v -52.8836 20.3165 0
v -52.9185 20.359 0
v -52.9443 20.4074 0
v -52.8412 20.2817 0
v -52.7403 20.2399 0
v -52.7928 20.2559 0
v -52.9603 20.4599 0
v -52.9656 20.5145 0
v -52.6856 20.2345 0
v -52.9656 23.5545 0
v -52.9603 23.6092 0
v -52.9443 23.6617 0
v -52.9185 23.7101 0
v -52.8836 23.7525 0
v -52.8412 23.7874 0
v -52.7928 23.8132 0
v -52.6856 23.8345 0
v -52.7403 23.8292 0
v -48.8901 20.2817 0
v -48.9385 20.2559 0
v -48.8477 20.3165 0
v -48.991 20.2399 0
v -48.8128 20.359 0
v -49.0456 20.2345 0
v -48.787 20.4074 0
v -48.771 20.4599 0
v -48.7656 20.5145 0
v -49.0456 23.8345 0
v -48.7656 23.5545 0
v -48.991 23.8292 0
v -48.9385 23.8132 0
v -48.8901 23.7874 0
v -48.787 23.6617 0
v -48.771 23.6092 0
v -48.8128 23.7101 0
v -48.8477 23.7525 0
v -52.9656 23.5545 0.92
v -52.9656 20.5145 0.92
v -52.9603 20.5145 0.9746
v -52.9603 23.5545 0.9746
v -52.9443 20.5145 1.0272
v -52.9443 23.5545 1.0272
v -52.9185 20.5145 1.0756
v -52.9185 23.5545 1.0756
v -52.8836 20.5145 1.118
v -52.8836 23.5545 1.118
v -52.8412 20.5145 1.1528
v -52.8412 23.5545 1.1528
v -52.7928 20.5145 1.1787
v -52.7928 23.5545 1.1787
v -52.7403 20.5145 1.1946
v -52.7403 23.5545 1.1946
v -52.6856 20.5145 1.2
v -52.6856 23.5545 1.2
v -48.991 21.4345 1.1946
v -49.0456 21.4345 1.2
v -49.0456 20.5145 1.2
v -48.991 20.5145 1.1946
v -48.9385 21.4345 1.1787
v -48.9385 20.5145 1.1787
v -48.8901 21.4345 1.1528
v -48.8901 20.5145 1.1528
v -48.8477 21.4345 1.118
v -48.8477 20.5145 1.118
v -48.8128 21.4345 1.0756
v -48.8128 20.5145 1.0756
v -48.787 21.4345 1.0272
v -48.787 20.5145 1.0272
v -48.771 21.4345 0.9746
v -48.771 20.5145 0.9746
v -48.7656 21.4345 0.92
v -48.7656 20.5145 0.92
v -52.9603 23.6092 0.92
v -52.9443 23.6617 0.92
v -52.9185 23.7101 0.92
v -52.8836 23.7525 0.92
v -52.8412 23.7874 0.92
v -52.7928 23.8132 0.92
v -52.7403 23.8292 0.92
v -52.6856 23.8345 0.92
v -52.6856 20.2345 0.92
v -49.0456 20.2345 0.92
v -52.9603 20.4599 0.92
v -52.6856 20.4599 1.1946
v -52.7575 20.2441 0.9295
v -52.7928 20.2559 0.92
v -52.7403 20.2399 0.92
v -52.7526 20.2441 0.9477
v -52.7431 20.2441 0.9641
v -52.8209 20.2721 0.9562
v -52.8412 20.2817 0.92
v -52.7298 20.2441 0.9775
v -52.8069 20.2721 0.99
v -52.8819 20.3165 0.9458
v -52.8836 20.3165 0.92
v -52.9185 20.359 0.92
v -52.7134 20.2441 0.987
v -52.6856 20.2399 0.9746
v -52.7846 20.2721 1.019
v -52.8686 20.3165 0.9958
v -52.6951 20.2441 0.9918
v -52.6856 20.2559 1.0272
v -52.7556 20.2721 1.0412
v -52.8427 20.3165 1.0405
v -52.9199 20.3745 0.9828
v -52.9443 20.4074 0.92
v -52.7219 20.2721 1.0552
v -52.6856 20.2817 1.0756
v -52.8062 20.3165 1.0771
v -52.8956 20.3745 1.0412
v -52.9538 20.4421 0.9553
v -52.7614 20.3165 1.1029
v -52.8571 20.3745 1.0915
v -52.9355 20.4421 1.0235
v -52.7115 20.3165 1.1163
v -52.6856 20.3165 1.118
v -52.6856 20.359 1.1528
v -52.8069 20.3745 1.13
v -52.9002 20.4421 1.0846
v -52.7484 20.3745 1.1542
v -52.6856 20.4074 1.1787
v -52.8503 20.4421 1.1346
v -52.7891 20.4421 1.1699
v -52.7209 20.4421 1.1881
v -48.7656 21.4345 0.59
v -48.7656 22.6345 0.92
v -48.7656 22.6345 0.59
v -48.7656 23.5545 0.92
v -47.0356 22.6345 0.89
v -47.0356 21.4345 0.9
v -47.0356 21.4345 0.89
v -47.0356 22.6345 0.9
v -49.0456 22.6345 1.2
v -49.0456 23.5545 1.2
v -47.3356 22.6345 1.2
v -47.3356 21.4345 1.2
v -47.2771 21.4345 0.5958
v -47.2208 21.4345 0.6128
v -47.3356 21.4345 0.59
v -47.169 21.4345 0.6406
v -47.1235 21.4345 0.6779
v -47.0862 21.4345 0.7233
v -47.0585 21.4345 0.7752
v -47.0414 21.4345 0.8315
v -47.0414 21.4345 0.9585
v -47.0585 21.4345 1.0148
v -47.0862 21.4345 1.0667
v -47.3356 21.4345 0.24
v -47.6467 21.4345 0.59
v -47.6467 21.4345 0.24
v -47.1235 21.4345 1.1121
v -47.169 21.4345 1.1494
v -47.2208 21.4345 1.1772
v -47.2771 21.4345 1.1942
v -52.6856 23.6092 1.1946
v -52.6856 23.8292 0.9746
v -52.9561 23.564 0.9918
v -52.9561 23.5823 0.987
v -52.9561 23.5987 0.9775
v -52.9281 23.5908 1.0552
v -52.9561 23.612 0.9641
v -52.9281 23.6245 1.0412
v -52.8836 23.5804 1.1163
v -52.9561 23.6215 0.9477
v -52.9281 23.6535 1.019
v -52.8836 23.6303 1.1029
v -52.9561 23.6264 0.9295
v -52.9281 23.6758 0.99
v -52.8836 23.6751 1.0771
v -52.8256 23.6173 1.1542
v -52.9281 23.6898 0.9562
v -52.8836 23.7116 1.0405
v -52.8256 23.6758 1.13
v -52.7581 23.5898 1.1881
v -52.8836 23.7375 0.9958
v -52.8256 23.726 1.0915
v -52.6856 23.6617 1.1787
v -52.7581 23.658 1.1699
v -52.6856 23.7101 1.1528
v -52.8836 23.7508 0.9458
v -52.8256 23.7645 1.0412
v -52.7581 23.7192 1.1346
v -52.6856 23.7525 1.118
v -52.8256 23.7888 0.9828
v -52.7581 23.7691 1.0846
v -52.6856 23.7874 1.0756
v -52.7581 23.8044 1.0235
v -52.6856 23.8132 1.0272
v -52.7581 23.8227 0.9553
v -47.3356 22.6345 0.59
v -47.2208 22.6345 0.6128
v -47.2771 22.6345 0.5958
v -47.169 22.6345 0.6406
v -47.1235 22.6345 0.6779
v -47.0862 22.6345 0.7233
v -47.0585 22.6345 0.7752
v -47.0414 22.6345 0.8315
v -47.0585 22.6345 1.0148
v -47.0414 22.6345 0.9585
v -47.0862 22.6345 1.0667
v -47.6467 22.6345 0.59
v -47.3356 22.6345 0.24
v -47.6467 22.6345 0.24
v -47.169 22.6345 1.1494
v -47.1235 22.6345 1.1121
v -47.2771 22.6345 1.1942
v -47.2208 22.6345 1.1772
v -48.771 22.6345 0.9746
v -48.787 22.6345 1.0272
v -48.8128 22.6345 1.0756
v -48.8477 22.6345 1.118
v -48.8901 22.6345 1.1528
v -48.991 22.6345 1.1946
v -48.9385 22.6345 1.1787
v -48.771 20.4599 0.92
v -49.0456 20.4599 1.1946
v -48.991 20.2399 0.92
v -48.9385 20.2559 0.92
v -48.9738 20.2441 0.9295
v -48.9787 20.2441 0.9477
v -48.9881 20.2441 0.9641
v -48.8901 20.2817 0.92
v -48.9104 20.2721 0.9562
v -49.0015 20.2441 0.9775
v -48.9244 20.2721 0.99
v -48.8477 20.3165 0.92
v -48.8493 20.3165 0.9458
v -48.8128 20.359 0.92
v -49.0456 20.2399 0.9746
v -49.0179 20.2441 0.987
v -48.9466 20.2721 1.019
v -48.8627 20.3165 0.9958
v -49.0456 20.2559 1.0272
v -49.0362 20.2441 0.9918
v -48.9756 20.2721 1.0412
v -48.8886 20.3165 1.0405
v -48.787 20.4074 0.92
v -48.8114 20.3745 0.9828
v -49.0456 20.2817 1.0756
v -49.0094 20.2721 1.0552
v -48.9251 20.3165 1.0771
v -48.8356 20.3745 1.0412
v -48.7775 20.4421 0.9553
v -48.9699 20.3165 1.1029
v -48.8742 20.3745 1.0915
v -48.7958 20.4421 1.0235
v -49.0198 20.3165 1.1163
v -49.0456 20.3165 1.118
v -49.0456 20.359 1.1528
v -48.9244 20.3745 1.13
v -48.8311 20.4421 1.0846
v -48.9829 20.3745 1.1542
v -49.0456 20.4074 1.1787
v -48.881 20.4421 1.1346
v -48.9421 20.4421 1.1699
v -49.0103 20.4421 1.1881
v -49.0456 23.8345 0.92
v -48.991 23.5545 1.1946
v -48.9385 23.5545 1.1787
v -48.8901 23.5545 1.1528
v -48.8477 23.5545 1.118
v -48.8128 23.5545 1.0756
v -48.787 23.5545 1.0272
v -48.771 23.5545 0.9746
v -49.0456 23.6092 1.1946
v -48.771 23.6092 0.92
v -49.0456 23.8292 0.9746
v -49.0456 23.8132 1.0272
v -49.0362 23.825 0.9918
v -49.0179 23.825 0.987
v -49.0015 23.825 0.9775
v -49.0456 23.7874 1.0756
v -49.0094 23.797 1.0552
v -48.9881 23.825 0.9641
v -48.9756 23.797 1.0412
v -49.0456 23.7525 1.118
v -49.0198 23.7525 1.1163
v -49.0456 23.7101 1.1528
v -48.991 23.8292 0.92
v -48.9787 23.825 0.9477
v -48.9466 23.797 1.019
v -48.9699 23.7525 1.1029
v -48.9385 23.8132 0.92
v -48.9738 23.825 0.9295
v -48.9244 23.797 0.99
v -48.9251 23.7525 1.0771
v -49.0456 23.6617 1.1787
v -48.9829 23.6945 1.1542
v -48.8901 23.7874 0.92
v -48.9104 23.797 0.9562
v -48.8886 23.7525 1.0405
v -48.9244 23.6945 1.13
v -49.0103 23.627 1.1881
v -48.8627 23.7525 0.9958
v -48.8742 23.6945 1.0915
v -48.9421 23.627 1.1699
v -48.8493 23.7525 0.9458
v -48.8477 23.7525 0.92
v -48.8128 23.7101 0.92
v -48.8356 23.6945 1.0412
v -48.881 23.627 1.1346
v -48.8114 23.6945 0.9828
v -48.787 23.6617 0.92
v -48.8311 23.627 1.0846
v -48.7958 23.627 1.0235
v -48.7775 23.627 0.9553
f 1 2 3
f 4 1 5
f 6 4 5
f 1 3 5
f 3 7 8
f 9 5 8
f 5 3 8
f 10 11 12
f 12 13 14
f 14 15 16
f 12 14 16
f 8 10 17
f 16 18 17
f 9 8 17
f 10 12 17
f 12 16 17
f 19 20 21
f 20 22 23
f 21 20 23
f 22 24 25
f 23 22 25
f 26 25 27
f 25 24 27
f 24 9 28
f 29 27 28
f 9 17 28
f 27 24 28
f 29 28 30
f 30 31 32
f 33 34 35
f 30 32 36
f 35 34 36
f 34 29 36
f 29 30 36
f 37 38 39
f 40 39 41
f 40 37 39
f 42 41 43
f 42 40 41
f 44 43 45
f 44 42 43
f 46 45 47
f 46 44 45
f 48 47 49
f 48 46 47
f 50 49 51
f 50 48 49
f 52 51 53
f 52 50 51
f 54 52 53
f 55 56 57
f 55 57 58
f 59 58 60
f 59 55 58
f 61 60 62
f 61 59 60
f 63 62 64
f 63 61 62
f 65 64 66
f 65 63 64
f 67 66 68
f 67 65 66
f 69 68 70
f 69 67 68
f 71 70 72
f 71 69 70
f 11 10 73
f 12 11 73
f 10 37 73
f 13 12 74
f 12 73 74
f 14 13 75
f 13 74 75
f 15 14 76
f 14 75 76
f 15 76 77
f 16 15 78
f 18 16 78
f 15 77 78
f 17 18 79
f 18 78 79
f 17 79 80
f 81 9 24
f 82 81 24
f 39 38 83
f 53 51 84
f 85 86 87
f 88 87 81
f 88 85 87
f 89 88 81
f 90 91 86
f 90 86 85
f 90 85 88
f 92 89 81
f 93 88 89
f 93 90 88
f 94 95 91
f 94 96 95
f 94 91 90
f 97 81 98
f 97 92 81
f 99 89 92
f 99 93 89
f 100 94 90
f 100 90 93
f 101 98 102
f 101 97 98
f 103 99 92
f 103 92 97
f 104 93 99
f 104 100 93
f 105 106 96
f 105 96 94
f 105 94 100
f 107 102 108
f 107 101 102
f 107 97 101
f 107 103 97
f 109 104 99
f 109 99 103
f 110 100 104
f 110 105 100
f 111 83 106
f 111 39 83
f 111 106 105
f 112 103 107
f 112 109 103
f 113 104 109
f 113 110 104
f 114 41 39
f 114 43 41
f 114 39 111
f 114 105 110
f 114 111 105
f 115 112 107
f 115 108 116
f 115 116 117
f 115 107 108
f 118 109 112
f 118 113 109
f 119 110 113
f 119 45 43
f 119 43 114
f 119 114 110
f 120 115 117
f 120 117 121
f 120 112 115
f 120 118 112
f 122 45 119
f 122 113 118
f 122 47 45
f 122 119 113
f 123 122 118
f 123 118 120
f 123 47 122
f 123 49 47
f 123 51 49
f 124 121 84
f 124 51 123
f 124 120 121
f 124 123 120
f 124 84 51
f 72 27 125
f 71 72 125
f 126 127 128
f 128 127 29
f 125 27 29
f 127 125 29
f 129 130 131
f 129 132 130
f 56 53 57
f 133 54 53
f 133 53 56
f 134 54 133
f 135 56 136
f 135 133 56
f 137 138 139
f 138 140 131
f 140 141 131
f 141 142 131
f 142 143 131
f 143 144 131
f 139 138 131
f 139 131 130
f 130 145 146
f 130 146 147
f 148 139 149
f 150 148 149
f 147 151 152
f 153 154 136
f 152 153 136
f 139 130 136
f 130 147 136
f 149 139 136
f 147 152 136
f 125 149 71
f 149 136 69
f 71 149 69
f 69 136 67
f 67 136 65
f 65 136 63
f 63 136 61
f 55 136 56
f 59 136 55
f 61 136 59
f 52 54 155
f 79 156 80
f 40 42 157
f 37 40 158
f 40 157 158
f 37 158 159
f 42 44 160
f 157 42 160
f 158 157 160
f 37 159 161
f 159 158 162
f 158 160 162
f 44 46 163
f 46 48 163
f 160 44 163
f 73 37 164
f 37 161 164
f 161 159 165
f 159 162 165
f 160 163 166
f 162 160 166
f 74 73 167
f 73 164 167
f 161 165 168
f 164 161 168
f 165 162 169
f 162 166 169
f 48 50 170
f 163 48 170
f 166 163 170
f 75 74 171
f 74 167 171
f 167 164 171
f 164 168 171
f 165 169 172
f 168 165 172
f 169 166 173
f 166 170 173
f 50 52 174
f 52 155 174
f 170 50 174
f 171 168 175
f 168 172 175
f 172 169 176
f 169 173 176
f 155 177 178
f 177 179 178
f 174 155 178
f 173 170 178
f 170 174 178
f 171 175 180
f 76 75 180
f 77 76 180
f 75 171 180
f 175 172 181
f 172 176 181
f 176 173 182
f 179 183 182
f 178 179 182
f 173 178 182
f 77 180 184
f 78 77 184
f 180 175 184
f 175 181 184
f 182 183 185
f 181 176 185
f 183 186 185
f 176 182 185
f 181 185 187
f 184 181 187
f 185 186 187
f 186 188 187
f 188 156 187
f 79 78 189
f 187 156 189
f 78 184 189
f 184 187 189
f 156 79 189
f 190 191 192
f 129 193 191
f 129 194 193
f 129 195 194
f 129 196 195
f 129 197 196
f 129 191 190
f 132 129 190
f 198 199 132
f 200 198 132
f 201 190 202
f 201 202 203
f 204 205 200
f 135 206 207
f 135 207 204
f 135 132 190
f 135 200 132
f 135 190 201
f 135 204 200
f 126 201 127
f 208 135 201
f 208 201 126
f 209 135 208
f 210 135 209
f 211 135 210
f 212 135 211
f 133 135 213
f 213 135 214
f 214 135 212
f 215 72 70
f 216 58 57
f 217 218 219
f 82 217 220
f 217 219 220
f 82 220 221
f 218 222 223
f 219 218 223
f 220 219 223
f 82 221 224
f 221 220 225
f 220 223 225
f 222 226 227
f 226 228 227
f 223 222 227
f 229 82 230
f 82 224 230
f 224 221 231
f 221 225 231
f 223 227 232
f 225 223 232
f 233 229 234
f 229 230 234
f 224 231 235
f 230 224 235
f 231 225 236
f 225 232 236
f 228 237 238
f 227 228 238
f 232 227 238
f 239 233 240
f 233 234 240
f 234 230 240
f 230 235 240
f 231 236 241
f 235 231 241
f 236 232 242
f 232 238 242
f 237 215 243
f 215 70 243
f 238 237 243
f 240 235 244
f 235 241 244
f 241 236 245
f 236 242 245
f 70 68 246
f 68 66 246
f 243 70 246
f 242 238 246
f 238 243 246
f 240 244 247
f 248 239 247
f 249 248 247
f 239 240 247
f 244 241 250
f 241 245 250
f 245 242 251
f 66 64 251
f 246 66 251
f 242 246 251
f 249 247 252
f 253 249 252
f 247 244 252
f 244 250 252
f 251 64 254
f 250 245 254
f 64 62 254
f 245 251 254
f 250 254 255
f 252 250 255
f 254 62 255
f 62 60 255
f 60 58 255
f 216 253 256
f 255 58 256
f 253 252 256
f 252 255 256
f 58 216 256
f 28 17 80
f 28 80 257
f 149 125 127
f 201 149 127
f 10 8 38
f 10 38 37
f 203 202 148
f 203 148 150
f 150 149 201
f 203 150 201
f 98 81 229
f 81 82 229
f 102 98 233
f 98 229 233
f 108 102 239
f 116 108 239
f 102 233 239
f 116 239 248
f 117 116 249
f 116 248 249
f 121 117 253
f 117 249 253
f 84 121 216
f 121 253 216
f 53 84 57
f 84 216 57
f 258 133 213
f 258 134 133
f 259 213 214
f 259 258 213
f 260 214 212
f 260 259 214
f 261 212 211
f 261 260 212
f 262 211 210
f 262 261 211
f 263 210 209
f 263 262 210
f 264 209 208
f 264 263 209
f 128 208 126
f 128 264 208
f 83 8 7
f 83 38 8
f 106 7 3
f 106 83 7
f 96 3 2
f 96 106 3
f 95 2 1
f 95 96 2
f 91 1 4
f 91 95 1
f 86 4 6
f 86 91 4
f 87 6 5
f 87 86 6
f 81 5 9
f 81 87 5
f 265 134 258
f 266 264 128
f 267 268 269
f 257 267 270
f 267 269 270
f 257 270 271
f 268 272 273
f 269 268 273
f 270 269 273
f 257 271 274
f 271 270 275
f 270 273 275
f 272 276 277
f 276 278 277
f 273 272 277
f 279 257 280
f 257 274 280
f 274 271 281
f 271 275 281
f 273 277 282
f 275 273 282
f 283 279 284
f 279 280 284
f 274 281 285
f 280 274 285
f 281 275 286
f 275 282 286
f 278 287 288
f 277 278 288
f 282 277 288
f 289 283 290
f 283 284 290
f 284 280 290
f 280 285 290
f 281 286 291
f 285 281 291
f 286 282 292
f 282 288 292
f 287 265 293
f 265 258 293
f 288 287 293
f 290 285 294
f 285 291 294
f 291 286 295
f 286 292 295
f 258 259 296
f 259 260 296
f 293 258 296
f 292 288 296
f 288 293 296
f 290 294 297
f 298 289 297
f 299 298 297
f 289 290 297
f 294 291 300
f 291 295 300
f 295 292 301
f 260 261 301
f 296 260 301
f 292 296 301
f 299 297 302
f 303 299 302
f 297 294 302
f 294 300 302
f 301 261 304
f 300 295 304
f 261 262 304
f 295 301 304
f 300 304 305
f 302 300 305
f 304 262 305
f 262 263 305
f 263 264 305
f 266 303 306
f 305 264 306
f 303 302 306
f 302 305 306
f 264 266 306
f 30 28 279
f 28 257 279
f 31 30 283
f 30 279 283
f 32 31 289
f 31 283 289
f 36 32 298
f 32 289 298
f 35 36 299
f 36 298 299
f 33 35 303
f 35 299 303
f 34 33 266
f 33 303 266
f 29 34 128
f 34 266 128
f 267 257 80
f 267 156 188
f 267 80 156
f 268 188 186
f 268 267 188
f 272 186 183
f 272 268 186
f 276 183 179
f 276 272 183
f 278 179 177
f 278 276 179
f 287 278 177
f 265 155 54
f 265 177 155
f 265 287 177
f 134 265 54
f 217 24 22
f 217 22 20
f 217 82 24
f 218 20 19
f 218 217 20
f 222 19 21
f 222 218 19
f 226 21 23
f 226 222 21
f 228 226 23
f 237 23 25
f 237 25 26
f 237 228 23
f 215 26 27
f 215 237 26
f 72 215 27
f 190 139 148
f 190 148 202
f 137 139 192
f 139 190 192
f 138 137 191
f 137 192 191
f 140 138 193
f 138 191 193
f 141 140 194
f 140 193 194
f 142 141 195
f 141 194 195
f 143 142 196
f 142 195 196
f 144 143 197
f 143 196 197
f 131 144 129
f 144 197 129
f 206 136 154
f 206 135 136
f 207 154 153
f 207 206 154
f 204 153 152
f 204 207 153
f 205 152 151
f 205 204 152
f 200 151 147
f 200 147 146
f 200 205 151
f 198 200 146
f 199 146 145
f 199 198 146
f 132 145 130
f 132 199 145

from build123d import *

# Parameters (mm, degrees)
SKETCH1_W           = 4.2
SKETCH1_H           = 3.6
BOSS_EXTRUDE1_DEPTH = 1.2
SKETCH2_W           = 0.61
SKETCH2_H           = 1.2
BOSS_EXTRUDE2_DEPTH = 1.73
FILLET6_R           = 0.28
FILLET8_R           = 0.3
SKETCH8_W           = 0.311061498
SKETCH8_H           = 1.2
BOSS_EXTRUDE3_DEPTH = 0.35


with BuildPart() as part:
    # Sketch1 → Boss-Extrude1 (new body)
    with BuildSketch(Plane.XY):
        with Locations((-50.865642715, 22.034539222)):
            Rectangle(SKETCH1_W, SKETCH1_H)
    extrude(amount=BOSS_EXTRUDE1_DEPTH)

    # Sketch2 → Boss-Extrude2 (add)
    with BuildSketch(Plane(origin=(-48.765642715, 0, 0), x_dir=(0, 0, -1), z_dir=(1, 0, 0))):
        with Locations((-0.895, 22.034539222)):
            Rectangle(SKETCH2_W, SKETCH2_H)
    extrude(amount=BOSS_EXTRUDE2_DEPTH)

    # Fillet6
    fillet6_edges = [part.edges().sort_by_distance(p)[0] for p in [
        (-48.765642715, 20.834539222, 1.2),
        (-48.765642715, 23.234539222, 1.2),
        (-50.865642715, 23.834539222, 1.2),
        (-52.965642715, 22.034539222, 1.2),
        (-52.965642715, 23.834539222, 0.6),
        (-48.765642715, 23.834539222, 0.6),
        (-48.765642715, 20.234539222, 0.6),
        (-52.965642715, 20.234539222, 0.6),
        (-50.865642715, 20.234539222, 1.2),
    ]]
    fillet(fillet6_edges, radius=FILLET6_R)

    # Fillet8
    fillet8_edges = [part.edges().sort_by_distance(p)[0] for p in [
        (-47.035642715, 22.034539222, 0.59),
        (-47.035642715, 22.034539222, 1.2),
    ]]
    fillet(fillet8_edges, radius=FILLET8_R)

    # Sketch8 → Boss-Extrude3 (add)
    with BuildSketch(Plane(origin=(0, 0, 0.59), x_dir=(-1, 0, 0), z_dir=(0, 0, -1))):
        with Locations((47.491173464, 22.034539222)):
            Rectangle(SKETCH8_W, SKETCH8_H)
    extrude(amount=BOSS_EXTRUDE3_DEPTH)


solid = part.part
